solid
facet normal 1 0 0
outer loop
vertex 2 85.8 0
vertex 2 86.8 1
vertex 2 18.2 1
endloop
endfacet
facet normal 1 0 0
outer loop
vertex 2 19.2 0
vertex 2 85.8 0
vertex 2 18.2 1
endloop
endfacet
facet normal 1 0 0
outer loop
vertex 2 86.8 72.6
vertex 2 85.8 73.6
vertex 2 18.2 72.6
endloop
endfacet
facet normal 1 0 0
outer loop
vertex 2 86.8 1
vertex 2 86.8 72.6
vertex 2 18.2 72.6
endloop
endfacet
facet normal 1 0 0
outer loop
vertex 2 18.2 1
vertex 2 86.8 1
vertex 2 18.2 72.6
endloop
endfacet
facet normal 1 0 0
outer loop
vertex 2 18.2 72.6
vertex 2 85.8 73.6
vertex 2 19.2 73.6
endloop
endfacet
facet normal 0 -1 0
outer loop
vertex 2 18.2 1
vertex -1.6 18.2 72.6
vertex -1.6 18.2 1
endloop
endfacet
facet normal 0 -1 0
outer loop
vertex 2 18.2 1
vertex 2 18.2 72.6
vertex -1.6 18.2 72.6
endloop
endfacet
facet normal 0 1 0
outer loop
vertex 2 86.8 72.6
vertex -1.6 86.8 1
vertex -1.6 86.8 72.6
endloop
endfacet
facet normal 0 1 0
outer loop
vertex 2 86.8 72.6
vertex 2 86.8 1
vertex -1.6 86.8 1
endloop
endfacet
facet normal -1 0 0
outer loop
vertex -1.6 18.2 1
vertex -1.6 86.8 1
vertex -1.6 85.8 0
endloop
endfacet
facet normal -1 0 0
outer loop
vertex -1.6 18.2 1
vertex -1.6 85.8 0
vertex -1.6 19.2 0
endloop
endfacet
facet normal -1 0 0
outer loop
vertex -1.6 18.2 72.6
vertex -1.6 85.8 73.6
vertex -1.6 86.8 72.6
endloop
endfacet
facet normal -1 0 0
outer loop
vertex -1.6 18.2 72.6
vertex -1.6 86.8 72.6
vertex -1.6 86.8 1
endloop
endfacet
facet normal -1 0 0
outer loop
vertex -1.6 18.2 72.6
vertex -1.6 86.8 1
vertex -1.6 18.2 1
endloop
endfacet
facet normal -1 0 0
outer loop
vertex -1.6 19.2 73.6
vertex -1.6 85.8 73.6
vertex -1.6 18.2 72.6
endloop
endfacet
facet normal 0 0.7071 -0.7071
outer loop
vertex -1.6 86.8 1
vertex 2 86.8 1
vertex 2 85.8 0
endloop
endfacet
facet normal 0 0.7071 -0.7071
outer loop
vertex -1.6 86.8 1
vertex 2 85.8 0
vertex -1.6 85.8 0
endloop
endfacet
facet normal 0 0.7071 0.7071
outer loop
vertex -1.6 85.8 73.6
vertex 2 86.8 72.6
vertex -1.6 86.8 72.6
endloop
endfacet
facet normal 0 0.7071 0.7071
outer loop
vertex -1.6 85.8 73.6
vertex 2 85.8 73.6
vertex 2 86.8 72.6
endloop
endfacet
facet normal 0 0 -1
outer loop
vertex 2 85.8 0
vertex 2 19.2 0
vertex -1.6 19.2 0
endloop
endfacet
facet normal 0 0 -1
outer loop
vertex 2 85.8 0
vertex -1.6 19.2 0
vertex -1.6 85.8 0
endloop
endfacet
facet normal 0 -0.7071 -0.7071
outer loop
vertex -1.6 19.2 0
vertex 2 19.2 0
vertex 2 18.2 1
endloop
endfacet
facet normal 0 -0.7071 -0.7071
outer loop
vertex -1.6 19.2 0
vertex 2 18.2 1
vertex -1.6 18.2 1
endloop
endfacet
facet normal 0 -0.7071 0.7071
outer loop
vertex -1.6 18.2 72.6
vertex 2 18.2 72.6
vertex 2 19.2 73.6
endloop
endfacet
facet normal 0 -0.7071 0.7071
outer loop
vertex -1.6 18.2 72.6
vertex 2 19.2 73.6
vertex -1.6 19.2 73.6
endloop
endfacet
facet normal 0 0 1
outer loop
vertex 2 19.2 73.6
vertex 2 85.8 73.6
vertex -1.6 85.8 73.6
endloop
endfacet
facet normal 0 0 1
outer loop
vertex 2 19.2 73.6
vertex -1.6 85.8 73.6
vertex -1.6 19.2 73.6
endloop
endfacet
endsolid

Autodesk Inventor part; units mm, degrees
ref_plane "YZ Plane" through (0, 0, 0) normal (1, 0, 0) x (0, 1, 0)
ref_plane "XZ Plane" through (0, 0, 0) normal (0, 1, 0) x (-1, 0, 0)
ref_plane "XY Plane" through (0, 0, 0) normal (0, 0, 1) x (1, 0, 0)
ref_plane "Work Plane1" through (2, 85, 71.8) normal (-1, 0, 0) x (0, -1, 0)
sketch "Sketch1" plane through (2, 85, 71.8) normal (-1, 0, 0) x (0, -1, 0)
  line L0 (66.8, 0.8) -> (66.8, -70.8) projected
  line L1 (-1.8, 1.8) -> (66.8, 1.8)
  line L2 (66.8, 1.8) -> (66.8, -71.8)
  line L3 (66.8, -71.8) -> (-1.8, -71.8)
  line L4 (-1.8, -71.8) -> (-1.8, 1.8)
  line L5 (67.8, -71.8) -> (170.8, -71.8) projected
  point P0 (85, -71.8)
  point P1 (66.8, 1.8)
  point P2 (66.8, 0.8)
extrude "Extrusion1" add sketch "Sketch1" along normal blind 3.6
chamfer "Chamfer1" distance 1 angle 45 4 edges at (0.2, 86.8, 73.6) (0.2, 18.2, 73.6) (0.2, 86.8, 0) (0.2, 18.2, 0)
equation "\"d0\" = wood_thickness"
equation "\"wood_thickness\" = 3.6"
properties part number "cover_wires"
